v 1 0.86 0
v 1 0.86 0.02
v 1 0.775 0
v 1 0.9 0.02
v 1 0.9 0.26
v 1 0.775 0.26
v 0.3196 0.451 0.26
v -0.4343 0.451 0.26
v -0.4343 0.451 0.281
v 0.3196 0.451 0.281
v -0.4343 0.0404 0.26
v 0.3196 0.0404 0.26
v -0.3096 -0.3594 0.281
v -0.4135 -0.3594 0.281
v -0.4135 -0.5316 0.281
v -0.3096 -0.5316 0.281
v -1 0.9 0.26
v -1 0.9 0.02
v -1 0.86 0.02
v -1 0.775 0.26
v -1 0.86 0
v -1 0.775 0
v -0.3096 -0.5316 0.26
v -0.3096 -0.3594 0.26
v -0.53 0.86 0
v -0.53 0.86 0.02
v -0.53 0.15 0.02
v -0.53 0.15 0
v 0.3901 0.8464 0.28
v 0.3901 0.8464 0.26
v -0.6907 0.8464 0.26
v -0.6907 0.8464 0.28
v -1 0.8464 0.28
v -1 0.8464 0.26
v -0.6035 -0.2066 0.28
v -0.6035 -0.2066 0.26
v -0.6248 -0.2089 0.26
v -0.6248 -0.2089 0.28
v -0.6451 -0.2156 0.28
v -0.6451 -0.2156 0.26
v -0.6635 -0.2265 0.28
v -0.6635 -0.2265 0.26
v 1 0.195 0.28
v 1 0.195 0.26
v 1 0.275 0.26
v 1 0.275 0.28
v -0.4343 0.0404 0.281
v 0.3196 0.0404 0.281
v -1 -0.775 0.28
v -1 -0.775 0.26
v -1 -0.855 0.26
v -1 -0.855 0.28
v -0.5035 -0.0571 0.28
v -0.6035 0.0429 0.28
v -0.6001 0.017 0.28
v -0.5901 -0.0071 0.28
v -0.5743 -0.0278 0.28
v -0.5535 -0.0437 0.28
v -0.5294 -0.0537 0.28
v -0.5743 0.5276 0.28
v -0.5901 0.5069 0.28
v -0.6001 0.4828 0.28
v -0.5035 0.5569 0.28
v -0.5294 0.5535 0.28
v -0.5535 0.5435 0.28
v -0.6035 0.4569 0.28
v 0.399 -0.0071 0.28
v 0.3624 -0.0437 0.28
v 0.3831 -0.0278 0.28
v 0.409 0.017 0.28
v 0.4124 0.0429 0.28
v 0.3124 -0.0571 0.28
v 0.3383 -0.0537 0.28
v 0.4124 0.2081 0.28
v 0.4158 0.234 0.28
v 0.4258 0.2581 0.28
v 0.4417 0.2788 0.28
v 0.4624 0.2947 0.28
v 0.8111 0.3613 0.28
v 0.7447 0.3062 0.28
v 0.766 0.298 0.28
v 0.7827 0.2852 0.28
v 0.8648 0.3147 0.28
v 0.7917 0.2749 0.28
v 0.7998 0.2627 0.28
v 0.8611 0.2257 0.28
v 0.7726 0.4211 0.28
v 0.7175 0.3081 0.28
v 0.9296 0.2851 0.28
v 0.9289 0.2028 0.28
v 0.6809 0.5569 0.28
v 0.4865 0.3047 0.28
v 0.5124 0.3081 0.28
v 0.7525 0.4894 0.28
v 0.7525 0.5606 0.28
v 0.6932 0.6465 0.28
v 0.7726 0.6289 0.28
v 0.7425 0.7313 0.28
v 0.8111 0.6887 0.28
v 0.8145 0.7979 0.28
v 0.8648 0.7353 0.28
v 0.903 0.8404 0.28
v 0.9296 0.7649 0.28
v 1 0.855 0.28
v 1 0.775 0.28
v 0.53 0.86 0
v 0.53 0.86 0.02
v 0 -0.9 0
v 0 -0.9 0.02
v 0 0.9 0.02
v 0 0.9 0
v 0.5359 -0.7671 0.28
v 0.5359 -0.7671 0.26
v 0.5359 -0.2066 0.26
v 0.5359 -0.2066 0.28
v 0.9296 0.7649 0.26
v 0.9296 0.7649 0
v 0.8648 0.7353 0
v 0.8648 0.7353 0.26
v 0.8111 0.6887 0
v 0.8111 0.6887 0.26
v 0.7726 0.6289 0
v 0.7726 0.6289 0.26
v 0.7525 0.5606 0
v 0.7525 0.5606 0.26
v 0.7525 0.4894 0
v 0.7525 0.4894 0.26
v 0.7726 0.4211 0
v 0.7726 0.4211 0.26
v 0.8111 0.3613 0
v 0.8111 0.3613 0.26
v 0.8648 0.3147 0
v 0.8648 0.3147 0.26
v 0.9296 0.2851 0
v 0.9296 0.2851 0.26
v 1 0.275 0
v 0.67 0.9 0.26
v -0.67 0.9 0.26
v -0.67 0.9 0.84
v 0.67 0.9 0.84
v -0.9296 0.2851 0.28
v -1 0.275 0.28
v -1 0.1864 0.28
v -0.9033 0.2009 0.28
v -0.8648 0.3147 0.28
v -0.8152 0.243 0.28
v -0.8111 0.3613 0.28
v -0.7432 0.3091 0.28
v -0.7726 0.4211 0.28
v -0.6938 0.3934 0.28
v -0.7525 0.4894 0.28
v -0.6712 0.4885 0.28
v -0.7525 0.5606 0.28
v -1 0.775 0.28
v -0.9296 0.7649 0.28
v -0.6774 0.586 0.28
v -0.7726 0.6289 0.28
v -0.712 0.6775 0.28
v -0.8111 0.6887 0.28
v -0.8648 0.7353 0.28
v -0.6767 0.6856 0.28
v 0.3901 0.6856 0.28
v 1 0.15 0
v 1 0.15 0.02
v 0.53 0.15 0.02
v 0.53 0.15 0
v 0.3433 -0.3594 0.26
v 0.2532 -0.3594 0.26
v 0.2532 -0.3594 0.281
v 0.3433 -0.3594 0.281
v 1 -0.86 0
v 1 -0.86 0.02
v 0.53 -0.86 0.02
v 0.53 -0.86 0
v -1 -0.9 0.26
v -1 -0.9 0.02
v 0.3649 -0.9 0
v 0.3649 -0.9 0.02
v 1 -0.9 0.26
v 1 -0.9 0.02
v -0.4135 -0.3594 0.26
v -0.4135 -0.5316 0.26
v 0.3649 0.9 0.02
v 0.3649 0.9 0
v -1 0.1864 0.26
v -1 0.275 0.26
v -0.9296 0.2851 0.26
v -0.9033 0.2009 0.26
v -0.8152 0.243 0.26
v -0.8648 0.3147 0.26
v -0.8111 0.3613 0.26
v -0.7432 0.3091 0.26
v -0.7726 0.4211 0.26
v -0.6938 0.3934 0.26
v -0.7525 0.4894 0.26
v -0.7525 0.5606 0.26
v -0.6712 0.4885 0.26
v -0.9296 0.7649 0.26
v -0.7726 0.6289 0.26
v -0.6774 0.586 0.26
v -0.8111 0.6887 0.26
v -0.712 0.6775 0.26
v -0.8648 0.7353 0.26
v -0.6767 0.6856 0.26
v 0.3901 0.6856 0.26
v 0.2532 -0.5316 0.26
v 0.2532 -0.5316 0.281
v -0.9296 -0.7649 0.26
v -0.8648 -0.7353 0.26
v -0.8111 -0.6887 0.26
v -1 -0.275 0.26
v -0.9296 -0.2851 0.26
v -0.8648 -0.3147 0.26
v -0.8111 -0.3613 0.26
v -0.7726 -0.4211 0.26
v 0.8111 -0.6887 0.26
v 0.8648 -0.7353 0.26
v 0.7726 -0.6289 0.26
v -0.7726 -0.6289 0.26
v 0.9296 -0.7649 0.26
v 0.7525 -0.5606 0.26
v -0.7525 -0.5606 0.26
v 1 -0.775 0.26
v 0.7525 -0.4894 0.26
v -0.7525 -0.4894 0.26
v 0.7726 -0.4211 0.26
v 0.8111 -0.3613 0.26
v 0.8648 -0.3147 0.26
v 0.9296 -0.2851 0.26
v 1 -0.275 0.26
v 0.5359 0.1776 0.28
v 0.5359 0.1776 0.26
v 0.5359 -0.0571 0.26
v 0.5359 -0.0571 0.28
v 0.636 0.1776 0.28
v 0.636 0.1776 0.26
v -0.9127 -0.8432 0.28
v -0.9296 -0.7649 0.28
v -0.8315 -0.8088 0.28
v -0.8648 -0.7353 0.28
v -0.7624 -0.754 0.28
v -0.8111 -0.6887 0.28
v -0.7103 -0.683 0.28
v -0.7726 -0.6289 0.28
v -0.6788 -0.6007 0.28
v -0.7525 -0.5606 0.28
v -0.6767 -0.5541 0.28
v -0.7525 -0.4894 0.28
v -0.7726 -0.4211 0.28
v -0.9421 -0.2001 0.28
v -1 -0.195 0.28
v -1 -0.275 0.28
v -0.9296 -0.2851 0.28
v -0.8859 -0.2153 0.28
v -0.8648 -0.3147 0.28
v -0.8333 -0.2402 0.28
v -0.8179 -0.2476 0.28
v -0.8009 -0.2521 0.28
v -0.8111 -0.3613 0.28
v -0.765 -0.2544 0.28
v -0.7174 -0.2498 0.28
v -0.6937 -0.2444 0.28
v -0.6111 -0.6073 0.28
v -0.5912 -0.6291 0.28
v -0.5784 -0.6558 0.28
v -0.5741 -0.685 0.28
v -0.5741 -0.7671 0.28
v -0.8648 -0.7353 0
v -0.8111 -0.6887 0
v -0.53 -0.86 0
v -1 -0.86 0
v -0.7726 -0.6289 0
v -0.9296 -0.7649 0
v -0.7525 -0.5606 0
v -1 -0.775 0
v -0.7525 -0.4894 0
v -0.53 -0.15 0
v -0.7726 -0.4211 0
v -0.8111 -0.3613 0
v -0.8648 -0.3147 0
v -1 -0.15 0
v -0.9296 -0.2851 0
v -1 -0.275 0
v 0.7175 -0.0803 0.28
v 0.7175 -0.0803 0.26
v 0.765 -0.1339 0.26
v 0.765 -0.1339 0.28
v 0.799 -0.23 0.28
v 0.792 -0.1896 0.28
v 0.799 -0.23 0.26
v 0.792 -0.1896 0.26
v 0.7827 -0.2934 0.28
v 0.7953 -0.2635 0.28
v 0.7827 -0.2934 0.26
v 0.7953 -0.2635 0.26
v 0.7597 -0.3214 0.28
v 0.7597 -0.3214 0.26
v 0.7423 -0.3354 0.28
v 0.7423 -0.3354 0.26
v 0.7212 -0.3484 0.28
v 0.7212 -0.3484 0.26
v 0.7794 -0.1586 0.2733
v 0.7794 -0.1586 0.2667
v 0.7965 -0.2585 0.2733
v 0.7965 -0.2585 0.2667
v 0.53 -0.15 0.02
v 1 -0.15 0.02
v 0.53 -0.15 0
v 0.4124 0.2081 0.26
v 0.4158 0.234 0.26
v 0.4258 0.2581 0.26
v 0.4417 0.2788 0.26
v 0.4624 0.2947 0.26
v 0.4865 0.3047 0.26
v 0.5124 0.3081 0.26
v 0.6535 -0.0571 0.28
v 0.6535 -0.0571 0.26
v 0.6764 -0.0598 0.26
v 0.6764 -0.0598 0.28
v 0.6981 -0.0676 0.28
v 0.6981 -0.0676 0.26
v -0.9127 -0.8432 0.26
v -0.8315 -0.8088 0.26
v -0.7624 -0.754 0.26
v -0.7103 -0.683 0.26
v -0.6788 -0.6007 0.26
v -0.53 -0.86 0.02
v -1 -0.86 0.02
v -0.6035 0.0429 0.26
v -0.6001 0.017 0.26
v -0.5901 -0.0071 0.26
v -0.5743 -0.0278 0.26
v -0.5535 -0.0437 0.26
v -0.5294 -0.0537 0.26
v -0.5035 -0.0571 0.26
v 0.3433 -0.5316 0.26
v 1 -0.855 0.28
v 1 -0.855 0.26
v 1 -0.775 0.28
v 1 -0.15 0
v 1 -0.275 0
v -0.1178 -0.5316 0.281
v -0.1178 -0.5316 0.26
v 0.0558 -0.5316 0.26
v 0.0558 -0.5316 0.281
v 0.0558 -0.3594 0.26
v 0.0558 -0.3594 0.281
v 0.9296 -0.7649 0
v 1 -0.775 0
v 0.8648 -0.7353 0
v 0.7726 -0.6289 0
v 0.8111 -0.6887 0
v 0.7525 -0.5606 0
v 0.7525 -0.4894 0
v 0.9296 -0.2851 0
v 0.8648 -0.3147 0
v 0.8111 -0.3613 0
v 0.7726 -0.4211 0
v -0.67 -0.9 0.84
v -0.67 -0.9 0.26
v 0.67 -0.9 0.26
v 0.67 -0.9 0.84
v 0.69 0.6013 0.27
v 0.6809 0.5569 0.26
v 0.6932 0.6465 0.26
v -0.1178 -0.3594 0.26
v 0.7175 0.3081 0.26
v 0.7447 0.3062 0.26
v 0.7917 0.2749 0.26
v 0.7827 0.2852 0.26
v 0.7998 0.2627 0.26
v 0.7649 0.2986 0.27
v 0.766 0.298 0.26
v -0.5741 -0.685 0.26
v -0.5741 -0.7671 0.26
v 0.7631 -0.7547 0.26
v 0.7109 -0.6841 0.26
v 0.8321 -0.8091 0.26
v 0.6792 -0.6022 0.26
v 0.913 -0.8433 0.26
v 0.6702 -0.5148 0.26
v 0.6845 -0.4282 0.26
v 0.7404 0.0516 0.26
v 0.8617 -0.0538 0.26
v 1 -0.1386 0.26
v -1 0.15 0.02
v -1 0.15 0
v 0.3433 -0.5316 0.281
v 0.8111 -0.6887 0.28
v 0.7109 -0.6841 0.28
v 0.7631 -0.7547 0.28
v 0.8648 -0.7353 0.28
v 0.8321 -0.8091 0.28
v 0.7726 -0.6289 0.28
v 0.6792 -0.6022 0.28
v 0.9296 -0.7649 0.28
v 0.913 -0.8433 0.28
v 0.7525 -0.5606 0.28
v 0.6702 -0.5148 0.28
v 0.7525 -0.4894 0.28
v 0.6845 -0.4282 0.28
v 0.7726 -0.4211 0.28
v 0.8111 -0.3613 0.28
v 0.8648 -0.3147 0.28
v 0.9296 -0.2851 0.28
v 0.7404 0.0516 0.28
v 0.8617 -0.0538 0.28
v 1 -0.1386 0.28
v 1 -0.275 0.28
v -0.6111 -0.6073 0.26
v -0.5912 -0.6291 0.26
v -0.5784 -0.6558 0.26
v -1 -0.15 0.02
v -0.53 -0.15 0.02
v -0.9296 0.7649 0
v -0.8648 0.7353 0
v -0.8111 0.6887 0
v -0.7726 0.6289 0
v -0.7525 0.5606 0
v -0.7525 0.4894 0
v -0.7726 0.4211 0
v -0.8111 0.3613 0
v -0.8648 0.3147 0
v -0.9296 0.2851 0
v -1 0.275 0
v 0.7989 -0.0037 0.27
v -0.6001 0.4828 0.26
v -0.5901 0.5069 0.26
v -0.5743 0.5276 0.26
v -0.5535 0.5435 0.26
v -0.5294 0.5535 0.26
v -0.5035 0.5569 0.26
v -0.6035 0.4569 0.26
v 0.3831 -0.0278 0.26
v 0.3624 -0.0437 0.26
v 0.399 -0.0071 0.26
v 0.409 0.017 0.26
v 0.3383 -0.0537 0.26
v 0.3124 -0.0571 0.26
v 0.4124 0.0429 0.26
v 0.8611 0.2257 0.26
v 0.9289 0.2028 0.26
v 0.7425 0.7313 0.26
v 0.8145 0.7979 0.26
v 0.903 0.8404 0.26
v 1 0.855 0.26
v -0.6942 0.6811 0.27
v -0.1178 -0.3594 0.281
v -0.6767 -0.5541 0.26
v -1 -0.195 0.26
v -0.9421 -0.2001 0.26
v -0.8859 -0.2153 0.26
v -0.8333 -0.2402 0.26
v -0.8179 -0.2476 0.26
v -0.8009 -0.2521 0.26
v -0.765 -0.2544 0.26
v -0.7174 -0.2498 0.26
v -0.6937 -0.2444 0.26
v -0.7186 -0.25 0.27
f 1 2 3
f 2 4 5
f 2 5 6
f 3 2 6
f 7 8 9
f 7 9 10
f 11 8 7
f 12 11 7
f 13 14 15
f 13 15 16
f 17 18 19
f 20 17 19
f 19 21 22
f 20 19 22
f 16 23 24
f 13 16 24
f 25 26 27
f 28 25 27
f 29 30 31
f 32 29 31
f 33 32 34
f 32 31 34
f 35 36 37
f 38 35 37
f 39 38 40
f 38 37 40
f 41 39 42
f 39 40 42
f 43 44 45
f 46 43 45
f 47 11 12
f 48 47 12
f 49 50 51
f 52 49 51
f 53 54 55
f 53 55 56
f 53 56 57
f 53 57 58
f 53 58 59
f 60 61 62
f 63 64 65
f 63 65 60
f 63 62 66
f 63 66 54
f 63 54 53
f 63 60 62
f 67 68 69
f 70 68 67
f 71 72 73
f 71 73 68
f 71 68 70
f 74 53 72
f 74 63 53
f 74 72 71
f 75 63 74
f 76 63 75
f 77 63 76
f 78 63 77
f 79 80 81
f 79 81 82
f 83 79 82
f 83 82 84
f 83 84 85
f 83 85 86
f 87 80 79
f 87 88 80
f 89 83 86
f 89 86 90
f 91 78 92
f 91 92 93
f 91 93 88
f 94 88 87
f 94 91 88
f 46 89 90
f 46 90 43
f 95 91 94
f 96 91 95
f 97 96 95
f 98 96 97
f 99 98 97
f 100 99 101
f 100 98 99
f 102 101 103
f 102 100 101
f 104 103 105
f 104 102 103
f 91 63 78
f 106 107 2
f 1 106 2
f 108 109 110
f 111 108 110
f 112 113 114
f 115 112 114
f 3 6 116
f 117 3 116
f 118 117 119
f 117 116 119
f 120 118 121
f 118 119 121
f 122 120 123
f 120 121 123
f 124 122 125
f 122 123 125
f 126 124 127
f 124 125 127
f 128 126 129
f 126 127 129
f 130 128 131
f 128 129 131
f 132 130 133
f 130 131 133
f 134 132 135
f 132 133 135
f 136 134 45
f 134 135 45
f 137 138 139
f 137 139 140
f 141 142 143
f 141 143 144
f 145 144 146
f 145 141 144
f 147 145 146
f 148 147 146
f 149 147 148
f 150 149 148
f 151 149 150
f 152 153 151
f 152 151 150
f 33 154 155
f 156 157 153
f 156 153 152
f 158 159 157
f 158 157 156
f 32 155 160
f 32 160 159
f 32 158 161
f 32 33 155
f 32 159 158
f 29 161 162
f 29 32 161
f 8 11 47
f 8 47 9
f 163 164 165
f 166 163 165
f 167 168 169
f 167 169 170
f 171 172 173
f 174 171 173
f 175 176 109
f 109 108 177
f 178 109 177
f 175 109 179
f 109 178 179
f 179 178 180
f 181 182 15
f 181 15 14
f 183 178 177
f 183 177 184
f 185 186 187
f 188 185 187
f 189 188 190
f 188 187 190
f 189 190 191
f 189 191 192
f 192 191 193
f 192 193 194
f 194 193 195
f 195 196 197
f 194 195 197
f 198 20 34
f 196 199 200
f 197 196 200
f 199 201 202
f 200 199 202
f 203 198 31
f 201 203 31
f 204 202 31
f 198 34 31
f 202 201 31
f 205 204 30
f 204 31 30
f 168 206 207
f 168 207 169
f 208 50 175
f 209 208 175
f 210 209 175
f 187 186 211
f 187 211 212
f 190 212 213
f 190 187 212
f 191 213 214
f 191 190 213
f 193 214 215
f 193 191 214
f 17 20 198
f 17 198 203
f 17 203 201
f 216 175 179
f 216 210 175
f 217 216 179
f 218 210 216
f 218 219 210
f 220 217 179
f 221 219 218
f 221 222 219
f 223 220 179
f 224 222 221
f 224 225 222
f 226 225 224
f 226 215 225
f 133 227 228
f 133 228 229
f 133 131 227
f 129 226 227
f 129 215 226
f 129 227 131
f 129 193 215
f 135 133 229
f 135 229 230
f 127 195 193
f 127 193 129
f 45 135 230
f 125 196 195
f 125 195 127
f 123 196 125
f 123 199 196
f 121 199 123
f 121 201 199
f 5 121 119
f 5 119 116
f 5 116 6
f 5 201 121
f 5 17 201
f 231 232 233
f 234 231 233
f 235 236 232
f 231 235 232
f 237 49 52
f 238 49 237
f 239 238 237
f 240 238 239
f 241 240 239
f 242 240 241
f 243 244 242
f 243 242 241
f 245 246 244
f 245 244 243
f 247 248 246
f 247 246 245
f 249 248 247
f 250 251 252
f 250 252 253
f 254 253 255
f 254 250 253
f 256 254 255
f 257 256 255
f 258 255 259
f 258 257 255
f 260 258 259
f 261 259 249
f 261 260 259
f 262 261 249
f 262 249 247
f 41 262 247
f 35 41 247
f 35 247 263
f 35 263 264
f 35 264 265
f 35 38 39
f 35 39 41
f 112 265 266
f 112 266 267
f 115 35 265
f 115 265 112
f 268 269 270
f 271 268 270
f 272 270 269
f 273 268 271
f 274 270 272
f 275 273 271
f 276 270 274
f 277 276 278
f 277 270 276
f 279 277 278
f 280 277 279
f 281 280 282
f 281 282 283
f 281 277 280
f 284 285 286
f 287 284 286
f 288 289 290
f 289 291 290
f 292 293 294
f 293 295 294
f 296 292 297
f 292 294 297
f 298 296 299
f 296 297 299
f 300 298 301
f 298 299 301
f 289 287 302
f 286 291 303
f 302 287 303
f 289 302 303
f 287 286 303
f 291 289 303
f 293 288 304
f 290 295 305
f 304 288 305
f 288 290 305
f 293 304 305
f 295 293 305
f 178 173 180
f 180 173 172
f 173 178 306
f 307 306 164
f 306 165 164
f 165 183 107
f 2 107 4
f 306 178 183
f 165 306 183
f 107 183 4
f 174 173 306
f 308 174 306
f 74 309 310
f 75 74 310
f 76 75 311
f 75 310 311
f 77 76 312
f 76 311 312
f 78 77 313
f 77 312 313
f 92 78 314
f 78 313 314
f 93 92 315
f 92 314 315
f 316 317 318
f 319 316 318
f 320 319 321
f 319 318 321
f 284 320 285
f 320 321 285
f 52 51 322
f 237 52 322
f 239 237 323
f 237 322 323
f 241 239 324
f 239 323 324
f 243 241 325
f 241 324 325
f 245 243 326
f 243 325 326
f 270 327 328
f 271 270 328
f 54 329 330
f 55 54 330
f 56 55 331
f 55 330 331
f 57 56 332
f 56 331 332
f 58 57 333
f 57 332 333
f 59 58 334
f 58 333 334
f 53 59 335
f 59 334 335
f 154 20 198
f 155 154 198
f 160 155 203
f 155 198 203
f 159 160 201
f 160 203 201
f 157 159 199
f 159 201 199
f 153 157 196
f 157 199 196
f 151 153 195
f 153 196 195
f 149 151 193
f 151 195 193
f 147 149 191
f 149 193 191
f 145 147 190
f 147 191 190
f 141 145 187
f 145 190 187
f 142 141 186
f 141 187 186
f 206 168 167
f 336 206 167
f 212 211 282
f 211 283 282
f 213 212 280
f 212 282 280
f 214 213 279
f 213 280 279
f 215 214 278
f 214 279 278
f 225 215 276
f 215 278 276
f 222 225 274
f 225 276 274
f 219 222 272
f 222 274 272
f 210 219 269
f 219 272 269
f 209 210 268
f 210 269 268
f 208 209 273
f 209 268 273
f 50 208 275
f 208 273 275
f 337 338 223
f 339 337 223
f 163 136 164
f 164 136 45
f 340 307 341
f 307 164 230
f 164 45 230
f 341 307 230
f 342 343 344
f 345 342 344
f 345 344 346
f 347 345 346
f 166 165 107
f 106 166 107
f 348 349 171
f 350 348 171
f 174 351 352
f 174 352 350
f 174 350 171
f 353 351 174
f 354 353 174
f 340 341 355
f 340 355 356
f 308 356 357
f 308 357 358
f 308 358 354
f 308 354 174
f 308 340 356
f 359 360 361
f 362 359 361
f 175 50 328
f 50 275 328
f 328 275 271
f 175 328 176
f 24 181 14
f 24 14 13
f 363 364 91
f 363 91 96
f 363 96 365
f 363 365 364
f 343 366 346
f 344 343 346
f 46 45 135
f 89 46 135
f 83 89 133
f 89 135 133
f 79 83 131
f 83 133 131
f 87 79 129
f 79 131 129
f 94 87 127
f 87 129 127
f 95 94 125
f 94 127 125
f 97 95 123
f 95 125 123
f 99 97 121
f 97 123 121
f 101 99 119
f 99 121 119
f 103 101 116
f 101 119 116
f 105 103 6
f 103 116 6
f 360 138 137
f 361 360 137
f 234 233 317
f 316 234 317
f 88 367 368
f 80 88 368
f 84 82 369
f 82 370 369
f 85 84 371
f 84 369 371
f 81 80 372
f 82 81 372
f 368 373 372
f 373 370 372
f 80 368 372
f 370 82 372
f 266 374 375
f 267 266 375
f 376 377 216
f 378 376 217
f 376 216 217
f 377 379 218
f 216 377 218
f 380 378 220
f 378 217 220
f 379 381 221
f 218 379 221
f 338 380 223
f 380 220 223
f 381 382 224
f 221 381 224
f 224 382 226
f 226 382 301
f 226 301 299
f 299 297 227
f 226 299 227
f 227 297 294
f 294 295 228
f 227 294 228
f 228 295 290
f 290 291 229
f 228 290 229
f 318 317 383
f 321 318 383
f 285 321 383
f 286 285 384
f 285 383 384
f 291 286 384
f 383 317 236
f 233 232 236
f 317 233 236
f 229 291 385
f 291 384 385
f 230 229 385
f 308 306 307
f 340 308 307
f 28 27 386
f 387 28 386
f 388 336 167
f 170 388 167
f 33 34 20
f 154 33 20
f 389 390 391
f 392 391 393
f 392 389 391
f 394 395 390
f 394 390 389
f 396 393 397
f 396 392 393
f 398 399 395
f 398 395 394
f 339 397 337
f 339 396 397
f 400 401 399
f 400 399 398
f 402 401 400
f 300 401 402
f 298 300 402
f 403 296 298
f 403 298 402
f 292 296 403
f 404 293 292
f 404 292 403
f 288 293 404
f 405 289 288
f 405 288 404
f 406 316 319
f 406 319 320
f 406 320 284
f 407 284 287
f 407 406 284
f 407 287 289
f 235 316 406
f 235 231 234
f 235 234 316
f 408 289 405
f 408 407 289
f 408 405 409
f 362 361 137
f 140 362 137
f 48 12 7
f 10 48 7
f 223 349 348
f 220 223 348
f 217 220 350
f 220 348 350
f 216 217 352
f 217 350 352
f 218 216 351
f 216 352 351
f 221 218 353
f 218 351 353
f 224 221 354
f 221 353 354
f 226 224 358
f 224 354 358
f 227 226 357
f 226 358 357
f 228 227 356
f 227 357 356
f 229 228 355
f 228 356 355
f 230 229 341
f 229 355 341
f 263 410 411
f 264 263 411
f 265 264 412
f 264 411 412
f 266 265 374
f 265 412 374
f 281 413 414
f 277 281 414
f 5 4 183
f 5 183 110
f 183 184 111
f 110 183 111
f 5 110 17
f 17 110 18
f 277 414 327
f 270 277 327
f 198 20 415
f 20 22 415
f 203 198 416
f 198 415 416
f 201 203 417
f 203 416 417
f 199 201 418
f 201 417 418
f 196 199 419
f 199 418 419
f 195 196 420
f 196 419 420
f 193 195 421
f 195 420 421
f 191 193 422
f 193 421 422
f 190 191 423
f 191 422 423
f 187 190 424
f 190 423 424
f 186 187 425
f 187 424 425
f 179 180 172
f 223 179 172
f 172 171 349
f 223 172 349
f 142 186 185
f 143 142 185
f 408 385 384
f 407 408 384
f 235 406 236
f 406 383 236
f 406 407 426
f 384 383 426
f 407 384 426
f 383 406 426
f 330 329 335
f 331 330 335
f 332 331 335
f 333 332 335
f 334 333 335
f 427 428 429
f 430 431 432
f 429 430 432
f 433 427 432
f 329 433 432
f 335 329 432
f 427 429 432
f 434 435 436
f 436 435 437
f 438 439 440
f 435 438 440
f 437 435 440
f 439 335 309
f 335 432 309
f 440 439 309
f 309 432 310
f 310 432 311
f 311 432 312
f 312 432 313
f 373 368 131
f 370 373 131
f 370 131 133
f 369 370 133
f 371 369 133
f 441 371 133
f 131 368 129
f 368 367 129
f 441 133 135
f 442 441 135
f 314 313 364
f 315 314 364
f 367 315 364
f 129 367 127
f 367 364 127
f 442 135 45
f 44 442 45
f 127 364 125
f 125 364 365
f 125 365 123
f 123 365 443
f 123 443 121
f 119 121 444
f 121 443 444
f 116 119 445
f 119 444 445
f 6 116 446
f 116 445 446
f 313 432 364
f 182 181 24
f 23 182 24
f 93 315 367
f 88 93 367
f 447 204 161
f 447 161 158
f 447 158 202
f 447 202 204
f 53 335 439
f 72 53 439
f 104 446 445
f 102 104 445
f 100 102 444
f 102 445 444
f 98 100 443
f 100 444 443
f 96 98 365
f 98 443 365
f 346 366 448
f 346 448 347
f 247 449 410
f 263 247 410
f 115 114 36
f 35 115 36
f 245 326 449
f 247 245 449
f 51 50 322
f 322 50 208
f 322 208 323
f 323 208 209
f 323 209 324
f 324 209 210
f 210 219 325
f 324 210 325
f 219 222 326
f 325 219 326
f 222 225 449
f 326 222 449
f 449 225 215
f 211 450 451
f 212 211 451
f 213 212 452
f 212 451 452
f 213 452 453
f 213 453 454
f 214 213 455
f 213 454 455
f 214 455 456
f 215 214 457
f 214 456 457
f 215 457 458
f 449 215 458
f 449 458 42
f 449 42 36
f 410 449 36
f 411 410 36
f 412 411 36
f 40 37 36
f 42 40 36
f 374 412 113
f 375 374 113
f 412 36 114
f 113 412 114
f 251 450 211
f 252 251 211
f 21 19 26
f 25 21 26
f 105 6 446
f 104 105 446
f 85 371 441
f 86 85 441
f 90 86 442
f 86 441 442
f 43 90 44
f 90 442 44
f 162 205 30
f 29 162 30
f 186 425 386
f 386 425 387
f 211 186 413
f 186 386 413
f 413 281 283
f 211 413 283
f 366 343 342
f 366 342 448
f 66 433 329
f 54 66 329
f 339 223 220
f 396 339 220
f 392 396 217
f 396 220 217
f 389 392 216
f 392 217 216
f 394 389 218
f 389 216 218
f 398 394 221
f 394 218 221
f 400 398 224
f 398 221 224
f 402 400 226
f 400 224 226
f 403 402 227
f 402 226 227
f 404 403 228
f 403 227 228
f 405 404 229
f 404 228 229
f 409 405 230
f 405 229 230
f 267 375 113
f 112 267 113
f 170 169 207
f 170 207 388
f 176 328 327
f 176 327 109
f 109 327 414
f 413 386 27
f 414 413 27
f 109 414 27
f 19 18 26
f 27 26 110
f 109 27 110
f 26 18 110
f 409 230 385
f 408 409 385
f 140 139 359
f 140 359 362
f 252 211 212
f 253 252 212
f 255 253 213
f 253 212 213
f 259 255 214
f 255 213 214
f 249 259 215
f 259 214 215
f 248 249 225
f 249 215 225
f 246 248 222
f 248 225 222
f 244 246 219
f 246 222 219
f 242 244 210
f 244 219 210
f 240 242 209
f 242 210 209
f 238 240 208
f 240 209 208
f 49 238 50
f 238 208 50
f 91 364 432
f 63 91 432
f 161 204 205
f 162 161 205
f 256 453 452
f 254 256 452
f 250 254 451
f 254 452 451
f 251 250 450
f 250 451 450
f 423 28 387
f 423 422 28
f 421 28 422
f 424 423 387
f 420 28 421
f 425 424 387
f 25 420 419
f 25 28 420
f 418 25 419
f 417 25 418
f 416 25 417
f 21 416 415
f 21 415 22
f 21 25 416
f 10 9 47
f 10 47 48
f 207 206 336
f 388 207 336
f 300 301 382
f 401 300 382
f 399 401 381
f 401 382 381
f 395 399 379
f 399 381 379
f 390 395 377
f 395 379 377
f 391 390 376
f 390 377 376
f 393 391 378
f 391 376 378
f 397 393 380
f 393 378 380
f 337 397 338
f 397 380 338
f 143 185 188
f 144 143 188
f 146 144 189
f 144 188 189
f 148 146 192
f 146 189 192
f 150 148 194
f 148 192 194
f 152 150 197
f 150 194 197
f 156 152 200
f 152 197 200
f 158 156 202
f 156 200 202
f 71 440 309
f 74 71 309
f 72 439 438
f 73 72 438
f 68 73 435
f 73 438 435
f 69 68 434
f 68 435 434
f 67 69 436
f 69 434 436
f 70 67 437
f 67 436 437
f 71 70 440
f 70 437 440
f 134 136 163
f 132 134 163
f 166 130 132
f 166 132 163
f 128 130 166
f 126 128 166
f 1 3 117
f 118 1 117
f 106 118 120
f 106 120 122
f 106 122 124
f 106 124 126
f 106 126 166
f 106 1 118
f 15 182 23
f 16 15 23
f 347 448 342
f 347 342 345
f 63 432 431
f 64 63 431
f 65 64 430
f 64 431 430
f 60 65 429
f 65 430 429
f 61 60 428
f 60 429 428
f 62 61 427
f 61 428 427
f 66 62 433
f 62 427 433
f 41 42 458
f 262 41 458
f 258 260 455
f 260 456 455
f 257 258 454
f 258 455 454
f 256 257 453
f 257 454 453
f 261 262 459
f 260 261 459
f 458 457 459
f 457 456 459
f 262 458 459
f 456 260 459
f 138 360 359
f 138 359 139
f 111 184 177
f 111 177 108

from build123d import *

# Parameters (mm, degrees)
BOSS_EXTRUDE1_DEPTH   = 0.24
SKETCH3_W             = 0.364889656
SKETCH3_H             = 1.8
BOSS_EXTRUDE2_DEPTH   = 0.02
BOSS_EXTRUDE3_DEPTH   = 0.02
BOSS_EXTRUDE3_2_DEPTH = 0.02
BOSS_EXTRUDE3_3_DEPTH = 0.02
BOSS_EXTRUDE3_4_DEPTH = 0.02
SKETCH5_W             = 0.753896915
SKETCH5_H             = 0.410580729
BOSS_EXTRUDE4_DEPTH   = 0.021
SKETCH5_W_2           = 0.173666543
SKETCH5_H_2           = 0.172266029
BOSS_EXTRUDE4_2_DEPTH = 0.021
SKETCH5_W_3           = 0.103954437
BOSS_EXTRUDE4_3_DEPTH = 0.021
SKETCH5_W_4           = 0.090039485
BOSS_EXTRUDE4_4_DEPTH = 0.021
SKETCH6_W             = 1.34
SKETCH6_H             = 1.8
BOSS_EXTRUDE5_DEPTH   = 0.58


with BuildPart() as part:
    # Sketch2 → Boss-Extrude1 (new body)
    with BuildSketch(Plane(origin=(0, 0, 0.02), x_dir=(-1, 0, 0), z_dir=(0, 0, -1))):
        with BuildLine():
            Line((1, -0.9), (-1, -0.9))
            Line((-1, -0.9), (-1, -0.775))
            ThreePointArc((-1, -0.775), (-0.75, -0.525), (-1, -0.275))
            Line((-1, -0.275), (-1, 0.275))
            ThreePointArc((-1, 0.275), (-0.75, 0.525), (-1, 0.775))
            Line((-1, 0.775), (-1, 0.9))
            Line((-1, 0.9), (1, 0.9))
            Line((1, 0.9), (1, 0.775))
            ThreePointArc((1, 0.775), (0.75, 0.525), (1, 0.275))
            Line((1, 0.275), (1, -0.275))
            ThreePointArc((1, -0.275), (0.75, -0.525), (1, -0.775))
            Line((1, -0.775), (1, -0.9))
        make_face()
    extrude(amount=-BOSS_EXTRUDE1_DEPTH)

    # Sketch3 → Boss-Extrude2 (add)
    with BuildSketch(Plane(origin=(0, 0, 0.02), x_dir=(-1, 0, 0), z_dir=(0, 0, -1))):
        with BuildLine():
            ThreePointArc((-1, 0.775), (-0.75, 0.525), (-1, 0.275))
            Line((-1, 0.275), (-1, 0.15))
            Line((-1, 0.15), (-0.53, 0.15))
            Line((-0.53, 0.15), (-0.53, 0.86))
            Line((-0.53, 0.86), (-1, 0.86))
            Line((-1, 0.86), (-1, 0.775))
        make_face()
        with BuildLine():
            Line((1, 0.775), (1, 0.86))
            Line((1, 0.86), (0.53, 0.86))
            Line((0.53, 0.86), (0.53, 0.15))
            Line((0.53, 0.15), (1, 0.15))
            Line((1, 0.15), (1, 0.275))
            ThreePointArc((1, 0.275), (0.75, 0.525), (1, 0.775))
        make_face()
        with BuildLine():
            Line((0.53, -0.86), (1, -0.86))
            Line((1, -0.86), (1, -0.775))
            ThreePointArc((1, -0.775), (0.75, -0.525), (1, -0.275))
            Line((1, -0.275), (1, -0.15))
            Line((1, -0.15), (0.53, -0.15))
            Line((0.53, -0.15), (0.53, -0.86))
        make_face()
        with BuildLine():
            Line((-0.53, -0.15), (-1, -0.15))
            Line((-1, -0.15), (-1, -0.275))
            ThreePointArc((-1, -0.275), (-0.75, -0.525), (-1, -0.775))
            Line((-1, -0.775), (-1, -0.86))
            Line((-1, -0.86), (-0.53, -0.86))
            Line((-0.53, -0.86), (-0.53, -0.15))
        make_face()
        with Locations((-0.182444828, 0)):
            Rectangle(SKETCH3_W, SKETCH3_H)
    extrude(amount=BOSS_EXTRUDE2_DEPTH)


with BuildPart() as body_2:
    # Sketch4 → Boss-Extrude3 (new body)
    with BuildSketch(Plane.XY.offset(0.26)):
        with BuildLine():
            Line((0.390148762, 0.846389186), (-0.69066899, 0.846389186))
            add(Edge.make_bspline(
                [(-0.69066899, 0.846389186), (-0.845334495, 0.846389186), (-1, 0.846389186)],
                knots=[0, 0, 0, 1, 1, 1], degree=2))
            Line((-1, 0.846389186), (-1, 0.775))
            ThreePointArc((-1, 0.775), (-0.75, 0.525), (-1, 0.275))
            Line((-1, 0.275), (-1, 0.186389186))
            ThreePointArc((-1, 0.186389186), (-0.715345164, 0.349441217), (-0.711984565, 0.677470251))
            add(Edge.make_bspline(
                [(-0.676691892, 0.685575063), (-0.694152628, 0.680731002), (-0.711984565, 0.677470251)],
                knots=[0, 0, 0, 1, 1, 1], degree=2))
            Line((-0.676691892, 0.685575063), (0.390148762, 0.685575063))
            Line((0.390148762, 0.685575063), (0.390148762, 0.846389186))
        make_face()
    extrude(amount=BOSS_EXTRUDE3_DEPTH)


with BuildPart() as body_3:
    # Sketch4 → Boss-Extrude3 2 (new body)
    with BuildSketch(Plane.XY.offset(0.26)):
        with BuildLine():
            Line((1, 0.775), (1, 0.855))
            ThreePointArc((1, 0.855), (0.814516991, 0.797939651), (0.69317777, 0.646491232))
            add(Edge.make_bspline(
                [(0.680908874, 0.556929298), (0.69288427, 0.60085648), (0.69317777, 0.646491232)],
                knots=[0, 0, 0, 1, 1, 1], degree=2))
            Line((0.680908874, 0.556929298), (-0.503543763, 0.556929298))
            ThreePointArc((-0.503543763, 0.556929298), (-0.574254441, 0.527639976), (-0.603543763, 0.456929298))
            Line((-0.603543763, 0.456929298), (-0.603543763, 0.04290495))
            ThreePointArc((-0.603543763, 0.04290495), (-0.574254441, -0.027805728), (-0.503543763, -0.05709505))
            Line((-0.503543763, -0.05709505), (0.312415517, -0.05709505))
            ThreePointArc((0.312415517, -0.05709505), (0.383126195, -0.027805728), (0.412415517, 0.04290495))
            Line((0.412415517, 0.04290495), (0.412415517, 0.208081796))
            ThreePointArc((0.412415517, 0.208081796), (0.441704839, 0.278792474), (0.512415517, 0.308081796))
            Line((0.512415517, 0.308081796), (0.717469575, 0.308081796))
            add(Edge.make_bspline(
                [(0.717469575, 0.308081796), (0.771233684, 0.311754034), (0.799786818, 0.262674474)],
                knots=[0, 0, 0, 1, 1, 1], degree=2))
            ThreePointArc((0.799786818, 0.262674474), (0.894329341, 0.212376086), (1, 0.195))
            Line((1, 0.195), (1, 0.275))
            ThreePointArc((1, 0.275), (0.75, 0.525), (1, 0.775))
        make_face()
    extrude(amount=BOSS_EXTRUDE3_2_DEPTH)


with BuildPart() as body_4:
    # Sketch4 → Boss-Extrude3 3 (new body)
    with BuildSketch(Plane.XY.offset(0.26)):
        with BuildLine():
            ThreePointArc((-0.833334938, -0.24017943), (-0.91365994, -0.206495064), (-1, -0.195))
            Line((-1, -0.195), (-1, -0.275))
            ThreePointArc((-1, -0.275), (-0.75, -0.525), (-1, -0.775))
            Line((-1, -0.775), (-1, -0.855))
            ThreePointArc((-1, -0.855), (-0.795148632, -0.783719765), (-0.678793346, -0.600672224))
            Line((-0.678793346, -0.600672224), (-0.676691892, -0.554145089))
            Line((-0.676691892, -0.554145089), (-0.611118313, -0.607286747))
            ThreePointArc((-0.611118313, -0.607286747), (-0.583813147, -0.641943472), (-0.574079844, -0.684977452))
            Line((-0.574079844, -0.684977452), (-0.574079844, -0.767129551))
            Line((-0.574079844, -0.767129551), (0.535920392, -0.767129551))
            Line((0.535920392, -0.767129551), (0.535920392, -0.20656652))
            Line((0.535920392, -0.20656652), (-0.603543763, -0.20656652))
            ThreePointArc((-0.603543763, -0.20656652), (-0.635114964, -0.211681014), (-0.66345675, -0.226501334))
            add(Edge.make_bspline(
                [(-0.66345675, -0.226501334), (-0.689269713, -0.245817241), (-0.725525791, -0.251252887), (-0.800759226, -0.260738541), (-0.833334938, -0.24017943)],
                knots=[0.089775833, 0.089775833, 0.089775833, 0.089775833, 0.400476653, 1, 1, 1, 1], degree=3))
        make_face()
    extrude(amount=BOSS_EXTRUDE3_3_DEPTH)


with BuildPart() as body_5:
    # Sketch4 → Boss-Extrude3 4 (new body)
    with BuildSketch(Plane.XY.offset(0.26)):
        with BuildLine():
            Line((1, -0.275), (1, -0.138574493))
            add(Edge.make_bspline(
                [(1, -0.138574493), (0.779830968, -0.026964761), (0.636027007, 0.177640765)],
                knots=[0, 0, 0, 1, 1, 1], degree=2))
            Line((0.636027007, 0.177640765), (0.535920392, 0.177640765))
            Line((0.535920392, 0.177640765), (0.535920392, -0.05709505))
            Line((0.535920392, -0.05709505), (0.653476764, -0.05709505))
            ThreePointArc((0.653476764, -0.05709505), (0.687503608, -0.063062216), (0.717469575, -0.080251572))
            add(Edge.make_bspline(
                [(0.717469575, -0.080251572), (0.785860125, -0.137205052), (0.858637114, -0.27404228), (0.721239787, -0.348385325)],
                knots=[0.124405165, 0.124405165, 0.124405165, 0.124405165, 1, 1, 1, 1], degree=3))
            ThreePointArc((0.721239787, -0.348385325), (0.710878189, -0.684086702), (1, -0.855))
            Line((1, -0.855), (1, -0.775))
            ThreePointArc((1, -0.775), (0.75, -0.525), (1, -0.275))
        make_face()
    extrude(amount=BOSS_EXTRUDE3_4_DEPTH)


with BuildPart() as body_6:
    # Sketch5 → Boss-Extrude4 (new body)
    with BuildSketch(Plane.XY.offset(0.26)):
        with Locations((-0.057365299, 0.245704269)):
            Rectangle(SKETCH5_W, SKETCH5_H)
    extrude(amount=BOSS_EXTRUDE4_DEPTH)


with BuildPart() as body_7:
    # Sketch5 → Boss-Extrude4 2 (new body)
    with BuildSketch(Plane.XY.offset(0.26)):
        with Locations((-0.030990211, -0.445513551)):
            Rectangle(SKETCH5_W_2, SKETCH5_H_2)
    extrude(amount=BOSS_EXTRUDE4_2_DEPTH)


with BuildPart() as body_8:
    # Sketch5 → Boss-Extrude4 3 (new body)
    with BuildSketch(Plane.XY.offset(0.26)):
        with Locations((-0.361571177, -0.445513551)):
            Rectangle(SKETCH5_W_3, SKETCH5_H_2)
    extrude(amount=BOSS_EXTRUDE4_3_DEPTH)


with BuildPart() as body_9:
    # Sketch5 → Boss-Extrude4 4 (new body)
    with BuildSketch(Plane.XY.offset(0.26)):
        with Locations((0.298247329, -0.445513551)):
            Rectangle(SKETCH5_W_4, SKETCH5_H_2)
    extrude(amount=BOSS_EXTRUDE4_4_DEPTH)


with BuildPart() as body_10:
    # Sketch6 → Boss-Extrude5 (new body)
    with BuildSketch(Plane.XY.offset(0.26)):
        Rectangle(SKETCH6_W, SKETCH6_H)
    extrude(amount=BOSS_EXTRUDE5_DEPTH)


solid = Compound([part.part, body_2.part, body_3.part, body_4.part, body_5.part, body_6.part, body_7.part, body_8.part, body_9.part, body_10.part])
